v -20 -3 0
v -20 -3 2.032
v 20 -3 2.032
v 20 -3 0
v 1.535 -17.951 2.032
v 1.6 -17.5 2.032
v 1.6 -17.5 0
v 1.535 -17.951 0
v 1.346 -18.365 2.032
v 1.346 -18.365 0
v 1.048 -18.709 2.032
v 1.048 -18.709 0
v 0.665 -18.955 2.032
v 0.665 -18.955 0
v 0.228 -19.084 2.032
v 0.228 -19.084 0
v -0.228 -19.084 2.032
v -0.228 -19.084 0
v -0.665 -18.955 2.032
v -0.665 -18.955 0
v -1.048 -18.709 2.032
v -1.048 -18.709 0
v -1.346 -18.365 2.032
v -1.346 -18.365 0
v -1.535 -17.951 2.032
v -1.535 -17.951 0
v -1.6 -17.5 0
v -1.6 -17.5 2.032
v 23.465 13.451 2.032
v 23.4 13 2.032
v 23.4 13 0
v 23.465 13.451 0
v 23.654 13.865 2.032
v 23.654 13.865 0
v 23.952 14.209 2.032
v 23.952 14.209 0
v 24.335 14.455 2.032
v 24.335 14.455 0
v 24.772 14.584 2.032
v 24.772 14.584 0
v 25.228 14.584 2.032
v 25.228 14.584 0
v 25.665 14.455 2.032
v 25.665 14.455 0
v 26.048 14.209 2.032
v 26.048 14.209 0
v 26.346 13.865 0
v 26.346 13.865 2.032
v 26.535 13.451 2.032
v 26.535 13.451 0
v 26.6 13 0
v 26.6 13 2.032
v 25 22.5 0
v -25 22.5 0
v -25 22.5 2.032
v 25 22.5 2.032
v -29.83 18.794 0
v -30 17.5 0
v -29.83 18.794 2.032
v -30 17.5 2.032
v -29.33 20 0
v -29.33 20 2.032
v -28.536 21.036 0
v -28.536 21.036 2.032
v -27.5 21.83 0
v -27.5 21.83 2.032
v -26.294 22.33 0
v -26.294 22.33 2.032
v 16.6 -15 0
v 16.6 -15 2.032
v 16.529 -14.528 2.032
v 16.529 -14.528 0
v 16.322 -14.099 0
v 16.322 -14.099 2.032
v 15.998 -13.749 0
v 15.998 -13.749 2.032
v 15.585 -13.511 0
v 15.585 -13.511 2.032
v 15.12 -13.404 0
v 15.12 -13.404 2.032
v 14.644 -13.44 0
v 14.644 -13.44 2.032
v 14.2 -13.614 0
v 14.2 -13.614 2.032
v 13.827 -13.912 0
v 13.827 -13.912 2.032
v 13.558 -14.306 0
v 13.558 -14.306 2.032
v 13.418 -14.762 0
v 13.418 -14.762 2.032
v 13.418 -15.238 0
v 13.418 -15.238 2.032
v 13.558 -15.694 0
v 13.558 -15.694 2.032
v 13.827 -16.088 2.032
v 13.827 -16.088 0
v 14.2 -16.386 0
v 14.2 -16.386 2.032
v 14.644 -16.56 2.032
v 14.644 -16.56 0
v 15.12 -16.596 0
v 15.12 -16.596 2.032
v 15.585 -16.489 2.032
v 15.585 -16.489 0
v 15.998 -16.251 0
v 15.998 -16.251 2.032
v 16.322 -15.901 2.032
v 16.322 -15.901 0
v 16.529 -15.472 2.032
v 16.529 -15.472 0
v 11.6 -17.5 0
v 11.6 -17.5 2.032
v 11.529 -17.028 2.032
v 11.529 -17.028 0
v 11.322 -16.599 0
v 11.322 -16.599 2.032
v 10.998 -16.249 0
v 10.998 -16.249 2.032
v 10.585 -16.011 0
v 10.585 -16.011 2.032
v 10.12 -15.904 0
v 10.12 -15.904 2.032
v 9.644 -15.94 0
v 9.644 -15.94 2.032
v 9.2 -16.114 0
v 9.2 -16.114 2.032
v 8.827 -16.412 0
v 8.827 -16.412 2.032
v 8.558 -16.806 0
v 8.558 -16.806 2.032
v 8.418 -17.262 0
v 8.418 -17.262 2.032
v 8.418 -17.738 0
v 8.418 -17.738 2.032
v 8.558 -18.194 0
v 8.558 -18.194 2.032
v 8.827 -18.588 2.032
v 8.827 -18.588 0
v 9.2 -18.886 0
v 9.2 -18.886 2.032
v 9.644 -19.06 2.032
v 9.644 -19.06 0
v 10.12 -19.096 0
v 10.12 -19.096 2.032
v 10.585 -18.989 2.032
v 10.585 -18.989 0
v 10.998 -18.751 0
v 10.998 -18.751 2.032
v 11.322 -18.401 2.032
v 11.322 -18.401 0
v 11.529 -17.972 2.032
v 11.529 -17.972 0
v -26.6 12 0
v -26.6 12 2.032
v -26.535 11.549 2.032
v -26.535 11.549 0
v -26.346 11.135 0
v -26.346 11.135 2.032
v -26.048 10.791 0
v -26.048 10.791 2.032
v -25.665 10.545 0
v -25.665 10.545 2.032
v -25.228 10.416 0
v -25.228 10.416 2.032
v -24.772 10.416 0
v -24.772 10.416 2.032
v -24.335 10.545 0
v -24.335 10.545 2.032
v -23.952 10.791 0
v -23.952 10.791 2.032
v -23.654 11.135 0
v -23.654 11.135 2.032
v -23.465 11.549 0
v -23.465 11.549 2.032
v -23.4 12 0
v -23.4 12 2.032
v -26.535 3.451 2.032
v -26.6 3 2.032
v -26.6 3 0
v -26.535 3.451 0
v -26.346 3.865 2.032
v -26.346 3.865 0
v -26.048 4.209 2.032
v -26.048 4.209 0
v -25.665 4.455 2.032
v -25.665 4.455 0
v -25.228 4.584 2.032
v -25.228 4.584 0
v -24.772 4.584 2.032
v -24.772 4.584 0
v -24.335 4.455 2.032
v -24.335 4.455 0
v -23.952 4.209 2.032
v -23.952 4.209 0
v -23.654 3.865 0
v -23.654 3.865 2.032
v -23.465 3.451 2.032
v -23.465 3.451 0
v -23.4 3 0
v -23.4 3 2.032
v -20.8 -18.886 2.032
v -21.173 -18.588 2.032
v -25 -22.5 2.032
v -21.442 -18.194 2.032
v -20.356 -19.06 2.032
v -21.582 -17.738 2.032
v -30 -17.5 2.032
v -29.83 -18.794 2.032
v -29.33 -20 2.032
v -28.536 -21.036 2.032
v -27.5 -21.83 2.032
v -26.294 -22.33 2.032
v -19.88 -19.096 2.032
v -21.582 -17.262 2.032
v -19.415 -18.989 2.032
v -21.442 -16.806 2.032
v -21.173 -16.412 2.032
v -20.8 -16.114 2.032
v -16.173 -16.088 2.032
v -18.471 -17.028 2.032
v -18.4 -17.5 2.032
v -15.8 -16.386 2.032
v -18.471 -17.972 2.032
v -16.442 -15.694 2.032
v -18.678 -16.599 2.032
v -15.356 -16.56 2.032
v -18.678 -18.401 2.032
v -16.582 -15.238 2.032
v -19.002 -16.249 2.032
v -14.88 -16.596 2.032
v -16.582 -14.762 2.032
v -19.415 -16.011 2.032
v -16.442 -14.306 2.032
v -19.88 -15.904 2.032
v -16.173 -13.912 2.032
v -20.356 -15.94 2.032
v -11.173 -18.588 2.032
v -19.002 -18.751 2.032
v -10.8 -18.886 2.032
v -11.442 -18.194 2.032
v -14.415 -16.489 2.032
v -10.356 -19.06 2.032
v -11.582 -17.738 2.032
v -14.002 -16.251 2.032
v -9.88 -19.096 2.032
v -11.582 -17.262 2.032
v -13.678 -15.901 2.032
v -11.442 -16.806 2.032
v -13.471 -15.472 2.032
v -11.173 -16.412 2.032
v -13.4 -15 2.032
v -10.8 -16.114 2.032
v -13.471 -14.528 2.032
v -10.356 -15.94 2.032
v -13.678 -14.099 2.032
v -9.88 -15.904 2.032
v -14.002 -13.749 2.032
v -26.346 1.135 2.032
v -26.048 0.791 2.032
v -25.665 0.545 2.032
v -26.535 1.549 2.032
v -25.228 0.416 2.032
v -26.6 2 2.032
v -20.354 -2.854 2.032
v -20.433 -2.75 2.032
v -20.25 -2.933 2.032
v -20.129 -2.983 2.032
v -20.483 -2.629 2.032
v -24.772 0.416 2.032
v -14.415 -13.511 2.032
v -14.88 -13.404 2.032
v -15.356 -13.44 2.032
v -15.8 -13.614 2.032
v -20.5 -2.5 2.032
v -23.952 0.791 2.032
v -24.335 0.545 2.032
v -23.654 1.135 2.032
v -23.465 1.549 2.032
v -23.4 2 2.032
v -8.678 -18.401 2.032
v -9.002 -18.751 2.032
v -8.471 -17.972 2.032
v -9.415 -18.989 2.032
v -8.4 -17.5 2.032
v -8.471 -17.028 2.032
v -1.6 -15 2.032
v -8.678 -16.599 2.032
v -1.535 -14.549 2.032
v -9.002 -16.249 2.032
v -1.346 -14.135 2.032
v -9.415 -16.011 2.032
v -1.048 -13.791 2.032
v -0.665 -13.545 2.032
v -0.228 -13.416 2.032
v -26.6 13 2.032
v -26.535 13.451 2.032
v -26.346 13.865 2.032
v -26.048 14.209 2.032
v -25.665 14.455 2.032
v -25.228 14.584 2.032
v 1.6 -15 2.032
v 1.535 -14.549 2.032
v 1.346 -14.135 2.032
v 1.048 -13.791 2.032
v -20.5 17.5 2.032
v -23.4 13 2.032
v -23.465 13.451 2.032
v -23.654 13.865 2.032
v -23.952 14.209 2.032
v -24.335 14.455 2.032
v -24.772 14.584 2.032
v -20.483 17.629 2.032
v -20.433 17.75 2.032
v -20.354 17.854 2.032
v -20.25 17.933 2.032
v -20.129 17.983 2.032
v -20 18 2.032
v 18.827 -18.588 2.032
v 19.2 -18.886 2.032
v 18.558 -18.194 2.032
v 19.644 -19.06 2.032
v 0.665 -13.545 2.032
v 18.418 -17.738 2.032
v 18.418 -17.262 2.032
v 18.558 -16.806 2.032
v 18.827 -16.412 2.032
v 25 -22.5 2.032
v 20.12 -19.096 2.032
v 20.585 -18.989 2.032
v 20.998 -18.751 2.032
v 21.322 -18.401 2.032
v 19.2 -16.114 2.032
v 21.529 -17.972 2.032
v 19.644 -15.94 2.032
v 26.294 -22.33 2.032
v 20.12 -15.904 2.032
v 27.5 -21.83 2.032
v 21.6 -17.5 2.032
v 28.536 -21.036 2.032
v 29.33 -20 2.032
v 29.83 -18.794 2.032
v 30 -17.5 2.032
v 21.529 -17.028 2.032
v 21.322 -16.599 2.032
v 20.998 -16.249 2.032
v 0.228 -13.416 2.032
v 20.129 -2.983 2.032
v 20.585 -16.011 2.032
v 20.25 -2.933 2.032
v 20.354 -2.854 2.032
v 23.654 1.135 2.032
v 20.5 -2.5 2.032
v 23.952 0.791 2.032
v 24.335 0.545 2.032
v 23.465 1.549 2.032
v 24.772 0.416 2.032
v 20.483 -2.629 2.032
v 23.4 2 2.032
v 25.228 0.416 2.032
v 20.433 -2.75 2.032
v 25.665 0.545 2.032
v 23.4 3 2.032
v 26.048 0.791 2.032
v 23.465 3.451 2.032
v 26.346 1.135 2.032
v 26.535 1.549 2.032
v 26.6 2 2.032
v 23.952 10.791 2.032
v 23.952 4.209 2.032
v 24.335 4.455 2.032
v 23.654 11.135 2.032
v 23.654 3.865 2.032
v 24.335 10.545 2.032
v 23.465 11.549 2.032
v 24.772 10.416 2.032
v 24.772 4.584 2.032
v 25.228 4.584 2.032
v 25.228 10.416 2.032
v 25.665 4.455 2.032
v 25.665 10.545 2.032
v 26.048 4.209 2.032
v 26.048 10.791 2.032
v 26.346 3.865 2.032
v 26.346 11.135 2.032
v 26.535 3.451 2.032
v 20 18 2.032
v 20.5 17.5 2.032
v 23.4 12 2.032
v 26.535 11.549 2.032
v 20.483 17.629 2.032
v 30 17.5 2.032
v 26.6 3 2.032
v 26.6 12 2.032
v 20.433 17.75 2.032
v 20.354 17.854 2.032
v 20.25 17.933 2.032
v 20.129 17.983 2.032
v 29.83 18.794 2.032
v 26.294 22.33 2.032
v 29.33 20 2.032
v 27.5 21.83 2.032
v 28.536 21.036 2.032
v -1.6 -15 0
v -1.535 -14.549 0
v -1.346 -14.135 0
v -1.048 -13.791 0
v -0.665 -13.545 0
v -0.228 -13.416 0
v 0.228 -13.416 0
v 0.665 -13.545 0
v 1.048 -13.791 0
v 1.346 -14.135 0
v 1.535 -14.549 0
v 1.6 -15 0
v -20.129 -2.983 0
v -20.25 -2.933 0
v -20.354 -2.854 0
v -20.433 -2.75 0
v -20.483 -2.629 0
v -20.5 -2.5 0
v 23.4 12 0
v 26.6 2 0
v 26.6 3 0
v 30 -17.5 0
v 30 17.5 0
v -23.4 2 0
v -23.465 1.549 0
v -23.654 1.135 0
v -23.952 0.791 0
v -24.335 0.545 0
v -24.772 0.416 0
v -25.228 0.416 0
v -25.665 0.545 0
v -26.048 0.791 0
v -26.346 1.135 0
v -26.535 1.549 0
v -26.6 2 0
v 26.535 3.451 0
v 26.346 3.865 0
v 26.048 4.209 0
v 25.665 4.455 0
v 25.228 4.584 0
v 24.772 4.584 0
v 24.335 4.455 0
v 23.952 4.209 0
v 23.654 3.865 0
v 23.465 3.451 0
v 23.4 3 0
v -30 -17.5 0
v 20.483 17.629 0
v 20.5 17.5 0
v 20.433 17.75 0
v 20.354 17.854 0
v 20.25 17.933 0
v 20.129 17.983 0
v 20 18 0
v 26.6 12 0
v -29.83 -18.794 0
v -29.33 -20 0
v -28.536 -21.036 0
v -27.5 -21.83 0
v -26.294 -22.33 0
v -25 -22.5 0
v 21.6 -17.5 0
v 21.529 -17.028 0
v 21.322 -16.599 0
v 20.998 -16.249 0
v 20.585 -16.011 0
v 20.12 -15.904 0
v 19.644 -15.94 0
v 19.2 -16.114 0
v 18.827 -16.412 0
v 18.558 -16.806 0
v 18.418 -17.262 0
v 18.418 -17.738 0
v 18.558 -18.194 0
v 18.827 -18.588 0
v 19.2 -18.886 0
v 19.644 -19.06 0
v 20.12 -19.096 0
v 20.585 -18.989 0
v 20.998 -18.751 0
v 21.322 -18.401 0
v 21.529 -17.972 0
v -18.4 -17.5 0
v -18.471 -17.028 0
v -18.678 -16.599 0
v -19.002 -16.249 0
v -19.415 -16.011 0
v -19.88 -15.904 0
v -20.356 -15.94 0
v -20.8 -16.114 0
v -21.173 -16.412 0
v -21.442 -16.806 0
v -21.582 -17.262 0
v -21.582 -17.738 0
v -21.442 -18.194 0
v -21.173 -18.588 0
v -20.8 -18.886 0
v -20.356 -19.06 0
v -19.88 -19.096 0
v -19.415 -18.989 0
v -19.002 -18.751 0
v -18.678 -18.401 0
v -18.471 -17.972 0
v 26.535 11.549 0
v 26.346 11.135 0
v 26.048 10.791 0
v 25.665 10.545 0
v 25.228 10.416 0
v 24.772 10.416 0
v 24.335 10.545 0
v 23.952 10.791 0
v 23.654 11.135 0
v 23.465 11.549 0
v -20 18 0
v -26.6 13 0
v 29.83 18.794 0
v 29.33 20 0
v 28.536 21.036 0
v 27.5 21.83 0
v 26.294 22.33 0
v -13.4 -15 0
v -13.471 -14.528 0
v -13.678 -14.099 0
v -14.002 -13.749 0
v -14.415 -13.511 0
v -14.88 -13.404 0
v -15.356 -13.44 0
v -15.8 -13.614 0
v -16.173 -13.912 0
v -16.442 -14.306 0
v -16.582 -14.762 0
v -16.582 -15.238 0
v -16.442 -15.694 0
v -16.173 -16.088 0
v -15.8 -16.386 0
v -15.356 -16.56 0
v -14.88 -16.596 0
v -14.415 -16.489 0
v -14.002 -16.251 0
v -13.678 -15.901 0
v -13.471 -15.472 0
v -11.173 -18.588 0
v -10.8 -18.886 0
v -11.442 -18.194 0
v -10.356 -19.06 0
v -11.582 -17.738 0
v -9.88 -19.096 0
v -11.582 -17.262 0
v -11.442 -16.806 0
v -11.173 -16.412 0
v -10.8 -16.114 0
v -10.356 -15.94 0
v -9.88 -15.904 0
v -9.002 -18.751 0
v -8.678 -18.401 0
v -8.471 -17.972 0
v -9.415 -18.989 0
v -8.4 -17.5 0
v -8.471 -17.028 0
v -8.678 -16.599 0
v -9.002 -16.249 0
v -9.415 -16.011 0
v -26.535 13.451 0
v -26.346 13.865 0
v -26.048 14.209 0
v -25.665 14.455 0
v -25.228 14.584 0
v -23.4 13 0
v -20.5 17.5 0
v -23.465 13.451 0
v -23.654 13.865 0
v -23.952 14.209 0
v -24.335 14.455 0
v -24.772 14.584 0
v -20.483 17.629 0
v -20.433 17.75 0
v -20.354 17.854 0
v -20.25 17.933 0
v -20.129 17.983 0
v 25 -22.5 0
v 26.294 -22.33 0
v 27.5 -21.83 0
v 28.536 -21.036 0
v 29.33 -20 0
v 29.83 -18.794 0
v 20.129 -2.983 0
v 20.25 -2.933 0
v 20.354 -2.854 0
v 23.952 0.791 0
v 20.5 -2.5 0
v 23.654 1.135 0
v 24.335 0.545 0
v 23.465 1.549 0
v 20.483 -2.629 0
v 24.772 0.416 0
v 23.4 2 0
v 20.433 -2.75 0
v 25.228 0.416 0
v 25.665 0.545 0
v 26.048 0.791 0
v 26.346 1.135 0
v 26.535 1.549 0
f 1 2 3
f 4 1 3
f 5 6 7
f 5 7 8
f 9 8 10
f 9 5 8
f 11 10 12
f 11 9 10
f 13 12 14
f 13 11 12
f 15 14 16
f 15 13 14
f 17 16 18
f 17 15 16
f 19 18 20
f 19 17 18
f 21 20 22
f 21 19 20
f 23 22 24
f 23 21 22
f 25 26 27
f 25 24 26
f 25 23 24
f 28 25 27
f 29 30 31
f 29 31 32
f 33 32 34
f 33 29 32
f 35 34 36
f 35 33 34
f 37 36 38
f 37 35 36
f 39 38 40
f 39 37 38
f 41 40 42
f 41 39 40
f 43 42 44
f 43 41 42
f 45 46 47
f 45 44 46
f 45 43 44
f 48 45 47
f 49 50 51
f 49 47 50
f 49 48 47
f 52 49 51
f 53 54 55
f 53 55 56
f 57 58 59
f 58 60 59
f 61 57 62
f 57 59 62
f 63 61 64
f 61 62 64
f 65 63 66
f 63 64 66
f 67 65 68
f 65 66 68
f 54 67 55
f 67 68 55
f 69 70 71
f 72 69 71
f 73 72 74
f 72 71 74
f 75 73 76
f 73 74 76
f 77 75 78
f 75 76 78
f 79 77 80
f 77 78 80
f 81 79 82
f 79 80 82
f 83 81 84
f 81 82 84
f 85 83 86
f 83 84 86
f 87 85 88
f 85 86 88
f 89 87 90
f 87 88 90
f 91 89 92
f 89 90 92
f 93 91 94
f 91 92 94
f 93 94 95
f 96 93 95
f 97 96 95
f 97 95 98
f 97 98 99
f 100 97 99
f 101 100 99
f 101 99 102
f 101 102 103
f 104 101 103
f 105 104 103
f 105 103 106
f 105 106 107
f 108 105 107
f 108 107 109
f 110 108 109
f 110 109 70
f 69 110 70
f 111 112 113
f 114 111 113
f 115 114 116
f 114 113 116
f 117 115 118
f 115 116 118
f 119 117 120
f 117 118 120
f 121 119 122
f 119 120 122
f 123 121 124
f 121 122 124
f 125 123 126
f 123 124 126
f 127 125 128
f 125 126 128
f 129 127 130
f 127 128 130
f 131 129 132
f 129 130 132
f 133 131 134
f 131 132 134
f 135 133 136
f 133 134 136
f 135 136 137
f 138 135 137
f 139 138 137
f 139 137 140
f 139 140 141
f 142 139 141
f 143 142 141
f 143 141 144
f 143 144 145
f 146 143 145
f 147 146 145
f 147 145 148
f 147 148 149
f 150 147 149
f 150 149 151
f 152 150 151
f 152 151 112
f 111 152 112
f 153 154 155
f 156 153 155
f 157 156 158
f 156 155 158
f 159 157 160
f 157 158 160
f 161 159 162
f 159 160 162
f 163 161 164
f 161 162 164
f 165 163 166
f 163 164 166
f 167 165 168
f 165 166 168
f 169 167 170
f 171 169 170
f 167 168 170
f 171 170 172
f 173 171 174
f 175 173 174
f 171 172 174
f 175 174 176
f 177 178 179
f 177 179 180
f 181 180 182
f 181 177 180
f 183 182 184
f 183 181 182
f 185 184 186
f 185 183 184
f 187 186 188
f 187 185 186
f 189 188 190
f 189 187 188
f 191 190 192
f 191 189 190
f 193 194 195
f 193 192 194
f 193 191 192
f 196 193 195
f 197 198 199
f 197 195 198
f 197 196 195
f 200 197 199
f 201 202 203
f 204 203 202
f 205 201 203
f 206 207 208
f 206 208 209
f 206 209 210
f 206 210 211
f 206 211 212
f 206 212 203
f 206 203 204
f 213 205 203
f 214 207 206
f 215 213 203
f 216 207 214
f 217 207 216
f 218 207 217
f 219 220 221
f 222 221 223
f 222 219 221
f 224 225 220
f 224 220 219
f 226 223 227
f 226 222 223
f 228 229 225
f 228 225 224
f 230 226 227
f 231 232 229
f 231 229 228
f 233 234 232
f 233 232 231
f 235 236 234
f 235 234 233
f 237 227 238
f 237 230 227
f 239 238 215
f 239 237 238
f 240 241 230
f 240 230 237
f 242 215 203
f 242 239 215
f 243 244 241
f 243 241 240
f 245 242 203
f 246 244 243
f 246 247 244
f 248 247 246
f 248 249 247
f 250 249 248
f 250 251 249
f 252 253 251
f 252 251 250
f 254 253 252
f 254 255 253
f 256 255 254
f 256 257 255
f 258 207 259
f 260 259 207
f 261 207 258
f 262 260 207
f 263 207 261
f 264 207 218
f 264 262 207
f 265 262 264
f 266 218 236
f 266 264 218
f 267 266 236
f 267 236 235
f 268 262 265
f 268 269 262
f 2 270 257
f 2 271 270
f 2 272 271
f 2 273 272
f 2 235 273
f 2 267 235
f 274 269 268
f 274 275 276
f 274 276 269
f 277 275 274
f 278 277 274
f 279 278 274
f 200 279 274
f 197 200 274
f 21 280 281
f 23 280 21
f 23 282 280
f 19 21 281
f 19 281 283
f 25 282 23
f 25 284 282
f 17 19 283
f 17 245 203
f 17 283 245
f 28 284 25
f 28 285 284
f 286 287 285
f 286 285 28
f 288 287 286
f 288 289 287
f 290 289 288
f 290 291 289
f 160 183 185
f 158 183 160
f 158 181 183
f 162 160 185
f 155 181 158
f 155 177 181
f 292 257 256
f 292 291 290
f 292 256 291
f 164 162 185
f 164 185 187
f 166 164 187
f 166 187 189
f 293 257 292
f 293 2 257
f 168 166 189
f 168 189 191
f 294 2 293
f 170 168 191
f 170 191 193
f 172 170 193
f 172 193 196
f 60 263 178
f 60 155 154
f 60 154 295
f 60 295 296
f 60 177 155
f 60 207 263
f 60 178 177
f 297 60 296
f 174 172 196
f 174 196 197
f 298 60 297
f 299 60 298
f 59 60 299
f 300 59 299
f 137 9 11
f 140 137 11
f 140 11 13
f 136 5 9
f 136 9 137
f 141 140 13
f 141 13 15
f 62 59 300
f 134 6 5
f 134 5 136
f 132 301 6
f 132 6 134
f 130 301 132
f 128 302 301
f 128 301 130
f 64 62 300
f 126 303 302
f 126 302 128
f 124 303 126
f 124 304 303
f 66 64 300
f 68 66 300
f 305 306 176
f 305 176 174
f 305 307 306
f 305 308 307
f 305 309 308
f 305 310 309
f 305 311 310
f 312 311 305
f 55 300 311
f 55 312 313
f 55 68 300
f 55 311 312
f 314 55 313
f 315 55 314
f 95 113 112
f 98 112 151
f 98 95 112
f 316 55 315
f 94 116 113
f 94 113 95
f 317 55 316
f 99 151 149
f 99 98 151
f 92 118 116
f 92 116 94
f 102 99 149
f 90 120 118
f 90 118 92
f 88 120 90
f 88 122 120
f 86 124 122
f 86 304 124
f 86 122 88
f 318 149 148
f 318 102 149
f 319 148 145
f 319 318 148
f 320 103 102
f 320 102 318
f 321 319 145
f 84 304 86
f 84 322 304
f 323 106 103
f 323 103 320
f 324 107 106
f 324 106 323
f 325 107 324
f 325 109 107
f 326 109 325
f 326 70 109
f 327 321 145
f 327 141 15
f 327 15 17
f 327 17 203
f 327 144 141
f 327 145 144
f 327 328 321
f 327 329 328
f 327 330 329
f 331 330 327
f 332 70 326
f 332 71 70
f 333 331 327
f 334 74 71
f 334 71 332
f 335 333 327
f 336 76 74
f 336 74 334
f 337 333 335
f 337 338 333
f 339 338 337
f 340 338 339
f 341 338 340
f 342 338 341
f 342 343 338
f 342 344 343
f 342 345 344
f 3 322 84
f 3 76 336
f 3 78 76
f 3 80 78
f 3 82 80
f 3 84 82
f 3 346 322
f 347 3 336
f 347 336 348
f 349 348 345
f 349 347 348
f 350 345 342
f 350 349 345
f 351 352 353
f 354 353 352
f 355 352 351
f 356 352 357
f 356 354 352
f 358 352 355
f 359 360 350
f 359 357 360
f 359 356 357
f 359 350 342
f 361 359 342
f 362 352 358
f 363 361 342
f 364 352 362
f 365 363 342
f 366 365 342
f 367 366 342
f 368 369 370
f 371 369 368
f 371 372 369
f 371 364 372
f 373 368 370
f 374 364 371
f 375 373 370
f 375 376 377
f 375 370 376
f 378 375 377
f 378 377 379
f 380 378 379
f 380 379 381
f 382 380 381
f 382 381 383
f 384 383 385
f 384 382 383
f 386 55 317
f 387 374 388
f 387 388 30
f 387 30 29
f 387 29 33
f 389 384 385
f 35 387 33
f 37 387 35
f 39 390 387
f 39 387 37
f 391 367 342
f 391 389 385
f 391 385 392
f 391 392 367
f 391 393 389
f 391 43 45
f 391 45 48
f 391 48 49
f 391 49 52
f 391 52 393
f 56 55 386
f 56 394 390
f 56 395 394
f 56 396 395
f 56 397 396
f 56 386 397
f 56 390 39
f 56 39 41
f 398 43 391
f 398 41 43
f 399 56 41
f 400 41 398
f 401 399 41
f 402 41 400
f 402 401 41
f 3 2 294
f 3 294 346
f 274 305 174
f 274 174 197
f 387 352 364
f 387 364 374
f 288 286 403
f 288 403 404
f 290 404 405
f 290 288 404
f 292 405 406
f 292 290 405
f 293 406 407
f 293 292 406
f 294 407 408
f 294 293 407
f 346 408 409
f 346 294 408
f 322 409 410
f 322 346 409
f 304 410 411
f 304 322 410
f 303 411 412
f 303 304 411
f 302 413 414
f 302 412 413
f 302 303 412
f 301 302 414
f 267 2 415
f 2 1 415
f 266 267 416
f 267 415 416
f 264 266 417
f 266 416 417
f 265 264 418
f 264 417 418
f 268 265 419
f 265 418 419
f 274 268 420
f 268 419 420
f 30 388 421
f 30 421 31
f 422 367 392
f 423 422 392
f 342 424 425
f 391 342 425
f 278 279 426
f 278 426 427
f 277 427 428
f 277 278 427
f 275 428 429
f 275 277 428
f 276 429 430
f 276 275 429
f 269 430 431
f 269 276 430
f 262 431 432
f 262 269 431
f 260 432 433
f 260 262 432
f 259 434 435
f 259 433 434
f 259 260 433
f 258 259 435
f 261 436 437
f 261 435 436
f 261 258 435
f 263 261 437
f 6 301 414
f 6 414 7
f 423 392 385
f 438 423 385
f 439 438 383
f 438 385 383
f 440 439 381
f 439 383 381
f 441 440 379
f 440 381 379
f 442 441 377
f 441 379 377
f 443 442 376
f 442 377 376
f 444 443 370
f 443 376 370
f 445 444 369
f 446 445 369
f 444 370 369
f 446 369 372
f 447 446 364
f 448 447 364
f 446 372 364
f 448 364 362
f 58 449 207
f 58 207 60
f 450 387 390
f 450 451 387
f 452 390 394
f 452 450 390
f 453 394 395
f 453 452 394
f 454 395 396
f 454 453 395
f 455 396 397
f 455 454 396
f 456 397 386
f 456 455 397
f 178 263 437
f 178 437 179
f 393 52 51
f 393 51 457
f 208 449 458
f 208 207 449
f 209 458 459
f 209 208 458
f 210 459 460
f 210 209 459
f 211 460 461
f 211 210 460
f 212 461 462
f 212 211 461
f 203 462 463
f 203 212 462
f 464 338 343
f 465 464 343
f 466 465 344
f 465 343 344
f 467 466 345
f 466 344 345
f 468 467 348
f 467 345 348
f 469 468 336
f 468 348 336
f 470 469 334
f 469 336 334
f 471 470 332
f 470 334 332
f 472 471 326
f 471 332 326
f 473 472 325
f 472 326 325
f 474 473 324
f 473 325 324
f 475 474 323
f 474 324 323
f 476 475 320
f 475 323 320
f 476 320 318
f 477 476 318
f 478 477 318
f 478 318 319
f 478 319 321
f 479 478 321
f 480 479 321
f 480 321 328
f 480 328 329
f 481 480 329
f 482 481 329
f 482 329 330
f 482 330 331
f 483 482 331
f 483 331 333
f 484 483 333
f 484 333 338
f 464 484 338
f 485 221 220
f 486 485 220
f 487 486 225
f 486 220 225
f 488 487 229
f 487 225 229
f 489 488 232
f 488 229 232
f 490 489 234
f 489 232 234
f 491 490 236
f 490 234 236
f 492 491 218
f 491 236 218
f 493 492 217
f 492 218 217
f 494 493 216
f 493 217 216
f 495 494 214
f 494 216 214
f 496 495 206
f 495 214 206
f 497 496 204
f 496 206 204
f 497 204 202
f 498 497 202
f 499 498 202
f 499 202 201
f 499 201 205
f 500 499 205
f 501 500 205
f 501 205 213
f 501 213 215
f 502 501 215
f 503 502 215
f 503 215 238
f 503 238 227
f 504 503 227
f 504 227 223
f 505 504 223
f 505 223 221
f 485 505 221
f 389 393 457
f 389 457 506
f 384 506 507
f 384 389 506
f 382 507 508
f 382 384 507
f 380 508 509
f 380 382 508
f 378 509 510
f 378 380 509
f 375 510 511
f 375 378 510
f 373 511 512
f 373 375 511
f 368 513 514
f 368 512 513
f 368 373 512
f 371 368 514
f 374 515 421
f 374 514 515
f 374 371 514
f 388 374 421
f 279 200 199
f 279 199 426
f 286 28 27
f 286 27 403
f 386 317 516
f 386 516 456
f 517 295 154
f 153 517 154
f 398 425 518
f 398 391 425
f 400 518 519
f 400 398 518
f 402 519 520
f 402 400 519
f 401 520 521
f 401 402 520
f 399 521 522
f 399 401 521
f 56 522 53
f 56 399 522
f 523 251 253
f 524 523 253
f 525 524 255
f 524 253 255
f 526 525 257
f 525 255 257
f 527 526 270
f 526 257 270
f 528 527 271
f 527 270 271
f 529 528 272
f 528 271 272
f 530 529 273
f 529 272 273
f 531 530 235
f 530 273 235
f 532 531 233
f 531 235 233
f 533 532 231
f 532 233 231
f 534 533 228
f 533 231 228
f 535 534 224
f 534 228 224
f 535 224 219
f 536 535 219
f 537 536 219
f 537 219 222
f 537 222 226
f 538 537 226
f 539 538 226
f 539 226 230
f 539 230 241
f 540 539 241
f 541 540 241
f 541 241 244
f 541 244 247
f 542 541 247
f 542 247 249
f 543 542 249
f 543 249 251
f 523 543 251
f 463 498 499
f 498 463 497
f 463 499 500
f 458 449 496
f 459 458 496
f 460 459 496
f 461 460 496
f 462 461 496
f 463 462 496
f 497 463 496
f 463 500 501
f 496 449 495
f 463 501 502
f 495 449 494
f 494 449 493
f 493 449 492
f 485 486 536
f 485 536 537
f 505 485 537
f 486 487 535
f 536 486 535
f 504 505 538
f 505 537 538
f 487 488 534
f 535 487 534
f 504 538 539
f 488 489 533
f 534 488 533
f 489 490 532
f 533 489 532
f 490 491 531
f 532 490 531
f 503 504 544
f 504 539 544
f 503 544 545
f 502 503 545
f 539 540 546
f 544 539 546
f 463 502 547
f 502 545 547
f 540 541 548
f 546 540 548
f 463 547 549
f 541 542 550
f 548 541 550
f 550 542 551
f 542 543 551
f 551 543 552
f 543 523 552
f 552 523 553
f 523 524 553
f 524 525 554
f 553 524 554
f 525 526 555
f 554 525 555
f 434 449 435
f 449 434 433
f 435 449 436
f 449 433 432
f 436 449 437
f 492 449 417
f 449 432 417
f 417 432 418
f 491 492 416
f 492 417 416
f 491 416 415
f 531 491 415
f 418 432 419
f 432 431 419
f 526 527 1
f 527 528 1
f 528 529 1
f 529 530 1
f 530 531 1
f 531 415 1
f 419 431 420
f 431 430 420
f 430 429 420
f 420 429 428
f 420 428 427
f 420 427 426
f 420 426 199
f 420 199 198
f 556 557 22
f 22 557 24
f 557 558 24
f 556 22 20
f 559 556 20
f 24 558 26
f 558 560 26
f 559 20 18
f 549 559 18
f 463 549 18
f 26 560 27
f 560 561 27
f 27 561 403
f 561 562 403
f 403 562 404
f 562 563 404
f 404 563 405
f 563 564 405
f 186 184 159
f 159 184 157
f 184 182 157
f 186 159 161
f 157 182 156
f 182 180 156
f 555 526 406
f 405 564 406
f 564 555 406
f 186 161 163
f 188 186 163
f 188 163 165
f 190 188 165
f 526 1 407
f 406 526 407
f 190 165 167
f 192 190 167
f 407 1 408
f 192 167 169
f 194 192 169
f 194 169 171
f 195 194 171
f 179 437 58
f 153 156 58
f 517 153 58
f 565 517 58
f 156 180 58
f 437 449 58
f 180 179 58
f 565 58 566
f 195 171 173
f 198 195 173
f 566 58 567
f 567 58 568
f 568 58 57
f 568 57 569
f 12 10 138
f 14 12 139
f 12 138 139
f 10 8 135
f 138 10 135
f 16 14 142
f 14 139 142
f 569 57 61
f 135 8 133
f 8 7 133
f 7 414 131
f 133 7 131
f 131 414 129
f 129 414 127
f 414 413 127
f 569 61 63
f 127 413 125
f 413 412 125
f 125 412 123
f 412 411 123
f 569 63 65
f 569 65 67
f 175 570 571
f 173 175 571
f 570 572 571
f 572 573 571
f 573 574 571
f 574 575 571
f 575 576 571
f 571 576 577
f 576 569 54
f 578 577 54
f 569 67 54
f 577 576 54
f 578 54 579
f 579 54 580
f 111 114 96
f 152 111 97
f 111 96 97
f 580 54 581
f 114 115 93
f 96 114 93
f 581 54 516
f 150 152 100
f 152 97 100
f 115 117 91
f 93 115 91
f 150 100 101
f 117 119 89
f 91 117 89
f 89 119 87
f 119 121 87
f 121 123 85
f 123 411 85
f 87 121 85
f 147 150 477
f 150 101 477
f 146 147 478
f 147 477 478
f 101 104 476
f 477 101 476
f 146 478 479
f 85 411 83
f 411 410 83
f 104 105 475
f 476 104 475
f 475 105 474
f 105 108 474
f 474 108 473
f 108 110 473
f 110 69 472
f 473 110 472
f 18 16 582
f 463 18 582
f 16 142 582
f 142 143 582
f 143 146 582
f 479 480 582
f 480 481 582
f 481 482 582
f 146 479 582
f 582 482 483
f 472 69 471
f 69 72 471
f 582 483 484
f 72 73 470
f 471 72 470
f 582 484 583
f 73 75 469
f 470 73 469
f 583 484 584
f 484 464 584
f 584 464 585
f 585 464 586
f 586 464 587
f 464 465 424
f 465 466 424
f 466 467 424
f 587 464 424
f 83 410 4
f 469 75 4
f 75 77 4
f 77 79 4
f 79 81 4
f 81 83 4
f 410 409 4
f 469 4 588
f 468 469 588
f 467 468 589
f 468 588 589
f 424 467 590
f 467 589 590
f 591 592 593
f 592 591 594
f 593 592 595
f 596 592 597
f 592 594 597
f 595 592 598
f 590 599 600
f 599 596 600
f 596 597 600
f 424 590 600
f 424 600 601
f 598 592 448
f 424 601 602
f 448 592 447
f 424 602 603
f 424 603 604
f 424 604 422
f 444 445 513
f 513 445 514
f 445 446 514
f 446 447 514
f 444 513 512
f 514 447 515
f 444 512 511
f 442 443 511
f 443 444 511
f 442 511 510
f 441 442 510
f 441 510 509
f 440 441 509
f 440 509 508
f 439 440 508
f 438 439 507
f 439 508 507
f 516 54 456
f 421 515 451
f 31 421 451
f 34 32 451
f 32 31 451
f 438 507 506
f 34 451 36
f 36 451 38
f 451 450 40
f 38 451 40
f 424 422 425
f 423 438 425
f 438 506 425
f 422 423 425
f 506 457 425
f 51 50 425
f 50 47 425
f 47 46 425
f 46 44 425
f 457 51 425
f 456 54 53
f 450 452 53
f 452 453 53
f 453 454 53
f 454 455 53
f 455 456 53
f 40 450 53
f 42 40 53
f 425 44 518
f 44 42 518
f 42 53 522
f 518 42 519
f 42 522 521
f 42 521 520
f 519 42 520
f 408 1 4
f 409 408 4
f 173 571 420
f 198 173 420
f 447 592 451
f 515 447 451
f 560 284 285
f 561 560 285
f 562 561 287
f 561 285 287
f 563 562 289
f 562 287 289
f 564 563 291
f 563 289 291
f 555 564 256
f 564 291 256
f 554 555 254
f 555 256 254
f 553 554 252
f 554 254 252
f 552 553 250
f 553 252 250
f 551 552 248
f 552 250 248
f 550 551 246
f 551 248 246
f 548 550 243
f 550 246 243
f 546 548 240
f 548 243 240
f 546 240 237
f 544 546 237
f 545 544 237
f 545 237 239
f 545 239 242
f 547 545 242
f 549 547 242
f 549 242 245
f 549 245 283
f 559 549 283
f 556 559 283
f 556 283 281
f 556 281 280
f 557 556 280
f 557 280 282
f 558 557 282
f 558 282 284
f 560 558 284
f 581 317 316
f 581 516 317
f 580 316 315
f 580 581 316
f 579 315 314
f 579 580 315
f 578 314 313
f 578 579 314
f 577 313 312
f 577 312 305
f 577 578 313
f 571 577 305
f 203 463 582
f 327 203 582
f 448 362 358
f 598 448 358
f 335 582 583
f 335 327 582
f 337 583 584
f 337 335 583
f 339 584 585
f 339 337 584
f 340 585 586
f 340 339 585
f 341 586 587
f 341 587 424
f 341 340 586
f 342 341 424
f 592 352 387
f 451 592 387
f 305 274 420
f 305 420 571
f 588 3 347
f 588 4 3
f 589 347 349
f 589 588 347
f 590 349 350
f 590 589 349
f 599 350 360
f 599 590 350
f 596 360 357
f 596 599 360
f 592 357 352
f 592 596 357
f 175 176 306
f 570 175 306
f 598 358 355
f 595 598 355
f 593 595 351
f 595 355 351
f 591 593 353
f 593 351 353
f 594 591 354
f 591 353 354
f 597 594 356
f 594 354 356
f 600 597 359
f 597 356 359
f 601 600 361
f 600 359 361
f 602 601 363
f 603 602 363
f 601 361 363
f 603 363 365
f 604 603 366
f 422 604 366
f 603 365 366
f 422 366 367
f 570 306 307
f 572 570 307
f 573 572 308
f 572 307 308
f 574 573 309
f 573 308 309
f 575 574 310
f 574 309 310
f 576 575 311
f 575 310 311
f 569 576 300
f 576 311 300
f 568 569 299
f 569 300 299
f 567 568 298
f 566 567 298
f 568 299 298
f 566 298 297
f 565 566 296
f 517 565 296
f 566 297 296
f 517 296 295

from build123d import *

# Parameters (mm, degrees)
SKETCH1_W           = 60
SKETCH1_H           = 45
BOSS_EXTRUDE1_DEPTH = 2.032
FILLET1_R           = 5
SKETCH2_W           = 41
SKETCH2_H           = 21
CUT_EXTRUDE1_DEPTH  = 3.032
FILLET2_R           = 0.5
CUT_EXTRUDE2_DEPTH  = 3.032
SKETCH4_R           = 1.6
CUT_EXTRUDE3_DEPTH  = 3.032


with BuildPart() as part:
    # Sketch1 → Boss-Extrude1 (new body)
    with BuildSketch(Plane.XY):
        Rectangle(SKETCH1_W, SKETCH1_H)
    extrude(amount=BOSS_EXTRUDE1_DEPTH)

    # Fillet1
    fillet1_edges = [part.edges().sort_by_distance(p)[0] for p in [
        (30, -22.5, 1.016),
        (-30, -22.5, 1.016),
        (-30, 22.5, 1.016),
        (30, 22.5, 1.016),
    ]]
    fillet(fillet1_edges, radius=FILLET1_R)

    # Sketch2 → Cut-Extrude1 (cut, through all)
    with BuildSketch(Plane.XY.offset(2.032)):
        with Locations((0, 7.5)):
            Rectangle(SKETCH2_W, SKETCH2_H)
    extrude(amount=-CUT_EXTRUDE1_DEPTH, mode=Mode.SUBTRACT)

    # Fillet2
    fillet2_edges = [part.edges().sort_by_distance(p)[0] for p in [
        (20.5, 18, 1.016),
        (20.5, -3, 1.016),
        (-20.5, -3, 1.016),
        (-20.5, 18, 1.016),
    ]]
    fillet(fillet2_edges, radius=FILLET2_R)

    # Sketch3 → Cut-Extrude2 (cut, through all)
    with BuildSketch(Plane.XY.offset(2.032)):
        with BuildLine():
            Line((-23.4, 3), (-23.4, 2))
            ThreePointArc((-23.4, 2), (-25, 0.4), (-26.6, 2))
            Line((-26.6, 2), (-26.6, 3))
            ThreePointArc((-26.6, 3), (-25, 4.6), (-23.4, 3))
        make_face()
        with BuildLine():
            Line((-23.4, 12), (-23.4, 13))
            ThreePointArc((-23.4, 13), (-25, 14.6), (-26.6, 13))
            Line((-26.6, 13), (-26.6, 12))
            ThreePointArc((-26.6, 12), (-25, 10.4), (-23.4, 12))
        make_face()
        with BuildLine():
            Line((23.4, 3), (23.4, 2))
            ThreePointArc((23.4, 2), (25, 0.4), (26.6, 2))
            Line((26.6, 2), (26.6, 3))
            ThreePointArc((26.6, 3), (25, 4.6), (23.4, 3))
        make_face()
        with BuildLine():
            Line((23.4, 12), (23.4, 13))
            ThreePointArc((23.4, 13), (25, 14.6), (26.6, 13))
            Line((26.6, 13), (26.6, 12))
            ThreePointArc((26.6, 12), (25, 10.4), (23.4, 12))
        make_face()
    extrude(amount=-CUT_EXTRUDE2_DEPTH, mode=Mode.SUBTRACT)

    # Sketch4 → Cut-Extrude3 (cut, through all)
    with BuildSketch(Plane.XY.offset(2.032)):
        with Locations((-15, -15)):
            Circle(SKETCH4_R)
        with Locations((15, -15)):
            Circle(SKETCH4_R)
        with Locations((10, -17.5)):
            Circle(SKETCH4_R)
        with Locations((-10, -17.5)):
            Circle(SKETCH4_R)
        with Locations((20, -17.5)):
            Circle(SKETCH4_R)
        with Locations((-20, -17.5)):
            Circle(SKETCH4_R)
        with BuildLine():
            Line((1.6, -15), (1.6, -17.5))
            ThreePointArc((1.6, -17.5), (0, -19.1), (-1.6, -17.5))
            Line((-1.6, -17.5), (-1.6, -15))
            ThreePointArc((-1.6, -15), (0, -13.4), (1.6, -15))
        make_face()
    extrude(amount=-CUT_EXTRUDE3_DEPTH, mode=Mode.SUBTRACT)


solid = part.part
